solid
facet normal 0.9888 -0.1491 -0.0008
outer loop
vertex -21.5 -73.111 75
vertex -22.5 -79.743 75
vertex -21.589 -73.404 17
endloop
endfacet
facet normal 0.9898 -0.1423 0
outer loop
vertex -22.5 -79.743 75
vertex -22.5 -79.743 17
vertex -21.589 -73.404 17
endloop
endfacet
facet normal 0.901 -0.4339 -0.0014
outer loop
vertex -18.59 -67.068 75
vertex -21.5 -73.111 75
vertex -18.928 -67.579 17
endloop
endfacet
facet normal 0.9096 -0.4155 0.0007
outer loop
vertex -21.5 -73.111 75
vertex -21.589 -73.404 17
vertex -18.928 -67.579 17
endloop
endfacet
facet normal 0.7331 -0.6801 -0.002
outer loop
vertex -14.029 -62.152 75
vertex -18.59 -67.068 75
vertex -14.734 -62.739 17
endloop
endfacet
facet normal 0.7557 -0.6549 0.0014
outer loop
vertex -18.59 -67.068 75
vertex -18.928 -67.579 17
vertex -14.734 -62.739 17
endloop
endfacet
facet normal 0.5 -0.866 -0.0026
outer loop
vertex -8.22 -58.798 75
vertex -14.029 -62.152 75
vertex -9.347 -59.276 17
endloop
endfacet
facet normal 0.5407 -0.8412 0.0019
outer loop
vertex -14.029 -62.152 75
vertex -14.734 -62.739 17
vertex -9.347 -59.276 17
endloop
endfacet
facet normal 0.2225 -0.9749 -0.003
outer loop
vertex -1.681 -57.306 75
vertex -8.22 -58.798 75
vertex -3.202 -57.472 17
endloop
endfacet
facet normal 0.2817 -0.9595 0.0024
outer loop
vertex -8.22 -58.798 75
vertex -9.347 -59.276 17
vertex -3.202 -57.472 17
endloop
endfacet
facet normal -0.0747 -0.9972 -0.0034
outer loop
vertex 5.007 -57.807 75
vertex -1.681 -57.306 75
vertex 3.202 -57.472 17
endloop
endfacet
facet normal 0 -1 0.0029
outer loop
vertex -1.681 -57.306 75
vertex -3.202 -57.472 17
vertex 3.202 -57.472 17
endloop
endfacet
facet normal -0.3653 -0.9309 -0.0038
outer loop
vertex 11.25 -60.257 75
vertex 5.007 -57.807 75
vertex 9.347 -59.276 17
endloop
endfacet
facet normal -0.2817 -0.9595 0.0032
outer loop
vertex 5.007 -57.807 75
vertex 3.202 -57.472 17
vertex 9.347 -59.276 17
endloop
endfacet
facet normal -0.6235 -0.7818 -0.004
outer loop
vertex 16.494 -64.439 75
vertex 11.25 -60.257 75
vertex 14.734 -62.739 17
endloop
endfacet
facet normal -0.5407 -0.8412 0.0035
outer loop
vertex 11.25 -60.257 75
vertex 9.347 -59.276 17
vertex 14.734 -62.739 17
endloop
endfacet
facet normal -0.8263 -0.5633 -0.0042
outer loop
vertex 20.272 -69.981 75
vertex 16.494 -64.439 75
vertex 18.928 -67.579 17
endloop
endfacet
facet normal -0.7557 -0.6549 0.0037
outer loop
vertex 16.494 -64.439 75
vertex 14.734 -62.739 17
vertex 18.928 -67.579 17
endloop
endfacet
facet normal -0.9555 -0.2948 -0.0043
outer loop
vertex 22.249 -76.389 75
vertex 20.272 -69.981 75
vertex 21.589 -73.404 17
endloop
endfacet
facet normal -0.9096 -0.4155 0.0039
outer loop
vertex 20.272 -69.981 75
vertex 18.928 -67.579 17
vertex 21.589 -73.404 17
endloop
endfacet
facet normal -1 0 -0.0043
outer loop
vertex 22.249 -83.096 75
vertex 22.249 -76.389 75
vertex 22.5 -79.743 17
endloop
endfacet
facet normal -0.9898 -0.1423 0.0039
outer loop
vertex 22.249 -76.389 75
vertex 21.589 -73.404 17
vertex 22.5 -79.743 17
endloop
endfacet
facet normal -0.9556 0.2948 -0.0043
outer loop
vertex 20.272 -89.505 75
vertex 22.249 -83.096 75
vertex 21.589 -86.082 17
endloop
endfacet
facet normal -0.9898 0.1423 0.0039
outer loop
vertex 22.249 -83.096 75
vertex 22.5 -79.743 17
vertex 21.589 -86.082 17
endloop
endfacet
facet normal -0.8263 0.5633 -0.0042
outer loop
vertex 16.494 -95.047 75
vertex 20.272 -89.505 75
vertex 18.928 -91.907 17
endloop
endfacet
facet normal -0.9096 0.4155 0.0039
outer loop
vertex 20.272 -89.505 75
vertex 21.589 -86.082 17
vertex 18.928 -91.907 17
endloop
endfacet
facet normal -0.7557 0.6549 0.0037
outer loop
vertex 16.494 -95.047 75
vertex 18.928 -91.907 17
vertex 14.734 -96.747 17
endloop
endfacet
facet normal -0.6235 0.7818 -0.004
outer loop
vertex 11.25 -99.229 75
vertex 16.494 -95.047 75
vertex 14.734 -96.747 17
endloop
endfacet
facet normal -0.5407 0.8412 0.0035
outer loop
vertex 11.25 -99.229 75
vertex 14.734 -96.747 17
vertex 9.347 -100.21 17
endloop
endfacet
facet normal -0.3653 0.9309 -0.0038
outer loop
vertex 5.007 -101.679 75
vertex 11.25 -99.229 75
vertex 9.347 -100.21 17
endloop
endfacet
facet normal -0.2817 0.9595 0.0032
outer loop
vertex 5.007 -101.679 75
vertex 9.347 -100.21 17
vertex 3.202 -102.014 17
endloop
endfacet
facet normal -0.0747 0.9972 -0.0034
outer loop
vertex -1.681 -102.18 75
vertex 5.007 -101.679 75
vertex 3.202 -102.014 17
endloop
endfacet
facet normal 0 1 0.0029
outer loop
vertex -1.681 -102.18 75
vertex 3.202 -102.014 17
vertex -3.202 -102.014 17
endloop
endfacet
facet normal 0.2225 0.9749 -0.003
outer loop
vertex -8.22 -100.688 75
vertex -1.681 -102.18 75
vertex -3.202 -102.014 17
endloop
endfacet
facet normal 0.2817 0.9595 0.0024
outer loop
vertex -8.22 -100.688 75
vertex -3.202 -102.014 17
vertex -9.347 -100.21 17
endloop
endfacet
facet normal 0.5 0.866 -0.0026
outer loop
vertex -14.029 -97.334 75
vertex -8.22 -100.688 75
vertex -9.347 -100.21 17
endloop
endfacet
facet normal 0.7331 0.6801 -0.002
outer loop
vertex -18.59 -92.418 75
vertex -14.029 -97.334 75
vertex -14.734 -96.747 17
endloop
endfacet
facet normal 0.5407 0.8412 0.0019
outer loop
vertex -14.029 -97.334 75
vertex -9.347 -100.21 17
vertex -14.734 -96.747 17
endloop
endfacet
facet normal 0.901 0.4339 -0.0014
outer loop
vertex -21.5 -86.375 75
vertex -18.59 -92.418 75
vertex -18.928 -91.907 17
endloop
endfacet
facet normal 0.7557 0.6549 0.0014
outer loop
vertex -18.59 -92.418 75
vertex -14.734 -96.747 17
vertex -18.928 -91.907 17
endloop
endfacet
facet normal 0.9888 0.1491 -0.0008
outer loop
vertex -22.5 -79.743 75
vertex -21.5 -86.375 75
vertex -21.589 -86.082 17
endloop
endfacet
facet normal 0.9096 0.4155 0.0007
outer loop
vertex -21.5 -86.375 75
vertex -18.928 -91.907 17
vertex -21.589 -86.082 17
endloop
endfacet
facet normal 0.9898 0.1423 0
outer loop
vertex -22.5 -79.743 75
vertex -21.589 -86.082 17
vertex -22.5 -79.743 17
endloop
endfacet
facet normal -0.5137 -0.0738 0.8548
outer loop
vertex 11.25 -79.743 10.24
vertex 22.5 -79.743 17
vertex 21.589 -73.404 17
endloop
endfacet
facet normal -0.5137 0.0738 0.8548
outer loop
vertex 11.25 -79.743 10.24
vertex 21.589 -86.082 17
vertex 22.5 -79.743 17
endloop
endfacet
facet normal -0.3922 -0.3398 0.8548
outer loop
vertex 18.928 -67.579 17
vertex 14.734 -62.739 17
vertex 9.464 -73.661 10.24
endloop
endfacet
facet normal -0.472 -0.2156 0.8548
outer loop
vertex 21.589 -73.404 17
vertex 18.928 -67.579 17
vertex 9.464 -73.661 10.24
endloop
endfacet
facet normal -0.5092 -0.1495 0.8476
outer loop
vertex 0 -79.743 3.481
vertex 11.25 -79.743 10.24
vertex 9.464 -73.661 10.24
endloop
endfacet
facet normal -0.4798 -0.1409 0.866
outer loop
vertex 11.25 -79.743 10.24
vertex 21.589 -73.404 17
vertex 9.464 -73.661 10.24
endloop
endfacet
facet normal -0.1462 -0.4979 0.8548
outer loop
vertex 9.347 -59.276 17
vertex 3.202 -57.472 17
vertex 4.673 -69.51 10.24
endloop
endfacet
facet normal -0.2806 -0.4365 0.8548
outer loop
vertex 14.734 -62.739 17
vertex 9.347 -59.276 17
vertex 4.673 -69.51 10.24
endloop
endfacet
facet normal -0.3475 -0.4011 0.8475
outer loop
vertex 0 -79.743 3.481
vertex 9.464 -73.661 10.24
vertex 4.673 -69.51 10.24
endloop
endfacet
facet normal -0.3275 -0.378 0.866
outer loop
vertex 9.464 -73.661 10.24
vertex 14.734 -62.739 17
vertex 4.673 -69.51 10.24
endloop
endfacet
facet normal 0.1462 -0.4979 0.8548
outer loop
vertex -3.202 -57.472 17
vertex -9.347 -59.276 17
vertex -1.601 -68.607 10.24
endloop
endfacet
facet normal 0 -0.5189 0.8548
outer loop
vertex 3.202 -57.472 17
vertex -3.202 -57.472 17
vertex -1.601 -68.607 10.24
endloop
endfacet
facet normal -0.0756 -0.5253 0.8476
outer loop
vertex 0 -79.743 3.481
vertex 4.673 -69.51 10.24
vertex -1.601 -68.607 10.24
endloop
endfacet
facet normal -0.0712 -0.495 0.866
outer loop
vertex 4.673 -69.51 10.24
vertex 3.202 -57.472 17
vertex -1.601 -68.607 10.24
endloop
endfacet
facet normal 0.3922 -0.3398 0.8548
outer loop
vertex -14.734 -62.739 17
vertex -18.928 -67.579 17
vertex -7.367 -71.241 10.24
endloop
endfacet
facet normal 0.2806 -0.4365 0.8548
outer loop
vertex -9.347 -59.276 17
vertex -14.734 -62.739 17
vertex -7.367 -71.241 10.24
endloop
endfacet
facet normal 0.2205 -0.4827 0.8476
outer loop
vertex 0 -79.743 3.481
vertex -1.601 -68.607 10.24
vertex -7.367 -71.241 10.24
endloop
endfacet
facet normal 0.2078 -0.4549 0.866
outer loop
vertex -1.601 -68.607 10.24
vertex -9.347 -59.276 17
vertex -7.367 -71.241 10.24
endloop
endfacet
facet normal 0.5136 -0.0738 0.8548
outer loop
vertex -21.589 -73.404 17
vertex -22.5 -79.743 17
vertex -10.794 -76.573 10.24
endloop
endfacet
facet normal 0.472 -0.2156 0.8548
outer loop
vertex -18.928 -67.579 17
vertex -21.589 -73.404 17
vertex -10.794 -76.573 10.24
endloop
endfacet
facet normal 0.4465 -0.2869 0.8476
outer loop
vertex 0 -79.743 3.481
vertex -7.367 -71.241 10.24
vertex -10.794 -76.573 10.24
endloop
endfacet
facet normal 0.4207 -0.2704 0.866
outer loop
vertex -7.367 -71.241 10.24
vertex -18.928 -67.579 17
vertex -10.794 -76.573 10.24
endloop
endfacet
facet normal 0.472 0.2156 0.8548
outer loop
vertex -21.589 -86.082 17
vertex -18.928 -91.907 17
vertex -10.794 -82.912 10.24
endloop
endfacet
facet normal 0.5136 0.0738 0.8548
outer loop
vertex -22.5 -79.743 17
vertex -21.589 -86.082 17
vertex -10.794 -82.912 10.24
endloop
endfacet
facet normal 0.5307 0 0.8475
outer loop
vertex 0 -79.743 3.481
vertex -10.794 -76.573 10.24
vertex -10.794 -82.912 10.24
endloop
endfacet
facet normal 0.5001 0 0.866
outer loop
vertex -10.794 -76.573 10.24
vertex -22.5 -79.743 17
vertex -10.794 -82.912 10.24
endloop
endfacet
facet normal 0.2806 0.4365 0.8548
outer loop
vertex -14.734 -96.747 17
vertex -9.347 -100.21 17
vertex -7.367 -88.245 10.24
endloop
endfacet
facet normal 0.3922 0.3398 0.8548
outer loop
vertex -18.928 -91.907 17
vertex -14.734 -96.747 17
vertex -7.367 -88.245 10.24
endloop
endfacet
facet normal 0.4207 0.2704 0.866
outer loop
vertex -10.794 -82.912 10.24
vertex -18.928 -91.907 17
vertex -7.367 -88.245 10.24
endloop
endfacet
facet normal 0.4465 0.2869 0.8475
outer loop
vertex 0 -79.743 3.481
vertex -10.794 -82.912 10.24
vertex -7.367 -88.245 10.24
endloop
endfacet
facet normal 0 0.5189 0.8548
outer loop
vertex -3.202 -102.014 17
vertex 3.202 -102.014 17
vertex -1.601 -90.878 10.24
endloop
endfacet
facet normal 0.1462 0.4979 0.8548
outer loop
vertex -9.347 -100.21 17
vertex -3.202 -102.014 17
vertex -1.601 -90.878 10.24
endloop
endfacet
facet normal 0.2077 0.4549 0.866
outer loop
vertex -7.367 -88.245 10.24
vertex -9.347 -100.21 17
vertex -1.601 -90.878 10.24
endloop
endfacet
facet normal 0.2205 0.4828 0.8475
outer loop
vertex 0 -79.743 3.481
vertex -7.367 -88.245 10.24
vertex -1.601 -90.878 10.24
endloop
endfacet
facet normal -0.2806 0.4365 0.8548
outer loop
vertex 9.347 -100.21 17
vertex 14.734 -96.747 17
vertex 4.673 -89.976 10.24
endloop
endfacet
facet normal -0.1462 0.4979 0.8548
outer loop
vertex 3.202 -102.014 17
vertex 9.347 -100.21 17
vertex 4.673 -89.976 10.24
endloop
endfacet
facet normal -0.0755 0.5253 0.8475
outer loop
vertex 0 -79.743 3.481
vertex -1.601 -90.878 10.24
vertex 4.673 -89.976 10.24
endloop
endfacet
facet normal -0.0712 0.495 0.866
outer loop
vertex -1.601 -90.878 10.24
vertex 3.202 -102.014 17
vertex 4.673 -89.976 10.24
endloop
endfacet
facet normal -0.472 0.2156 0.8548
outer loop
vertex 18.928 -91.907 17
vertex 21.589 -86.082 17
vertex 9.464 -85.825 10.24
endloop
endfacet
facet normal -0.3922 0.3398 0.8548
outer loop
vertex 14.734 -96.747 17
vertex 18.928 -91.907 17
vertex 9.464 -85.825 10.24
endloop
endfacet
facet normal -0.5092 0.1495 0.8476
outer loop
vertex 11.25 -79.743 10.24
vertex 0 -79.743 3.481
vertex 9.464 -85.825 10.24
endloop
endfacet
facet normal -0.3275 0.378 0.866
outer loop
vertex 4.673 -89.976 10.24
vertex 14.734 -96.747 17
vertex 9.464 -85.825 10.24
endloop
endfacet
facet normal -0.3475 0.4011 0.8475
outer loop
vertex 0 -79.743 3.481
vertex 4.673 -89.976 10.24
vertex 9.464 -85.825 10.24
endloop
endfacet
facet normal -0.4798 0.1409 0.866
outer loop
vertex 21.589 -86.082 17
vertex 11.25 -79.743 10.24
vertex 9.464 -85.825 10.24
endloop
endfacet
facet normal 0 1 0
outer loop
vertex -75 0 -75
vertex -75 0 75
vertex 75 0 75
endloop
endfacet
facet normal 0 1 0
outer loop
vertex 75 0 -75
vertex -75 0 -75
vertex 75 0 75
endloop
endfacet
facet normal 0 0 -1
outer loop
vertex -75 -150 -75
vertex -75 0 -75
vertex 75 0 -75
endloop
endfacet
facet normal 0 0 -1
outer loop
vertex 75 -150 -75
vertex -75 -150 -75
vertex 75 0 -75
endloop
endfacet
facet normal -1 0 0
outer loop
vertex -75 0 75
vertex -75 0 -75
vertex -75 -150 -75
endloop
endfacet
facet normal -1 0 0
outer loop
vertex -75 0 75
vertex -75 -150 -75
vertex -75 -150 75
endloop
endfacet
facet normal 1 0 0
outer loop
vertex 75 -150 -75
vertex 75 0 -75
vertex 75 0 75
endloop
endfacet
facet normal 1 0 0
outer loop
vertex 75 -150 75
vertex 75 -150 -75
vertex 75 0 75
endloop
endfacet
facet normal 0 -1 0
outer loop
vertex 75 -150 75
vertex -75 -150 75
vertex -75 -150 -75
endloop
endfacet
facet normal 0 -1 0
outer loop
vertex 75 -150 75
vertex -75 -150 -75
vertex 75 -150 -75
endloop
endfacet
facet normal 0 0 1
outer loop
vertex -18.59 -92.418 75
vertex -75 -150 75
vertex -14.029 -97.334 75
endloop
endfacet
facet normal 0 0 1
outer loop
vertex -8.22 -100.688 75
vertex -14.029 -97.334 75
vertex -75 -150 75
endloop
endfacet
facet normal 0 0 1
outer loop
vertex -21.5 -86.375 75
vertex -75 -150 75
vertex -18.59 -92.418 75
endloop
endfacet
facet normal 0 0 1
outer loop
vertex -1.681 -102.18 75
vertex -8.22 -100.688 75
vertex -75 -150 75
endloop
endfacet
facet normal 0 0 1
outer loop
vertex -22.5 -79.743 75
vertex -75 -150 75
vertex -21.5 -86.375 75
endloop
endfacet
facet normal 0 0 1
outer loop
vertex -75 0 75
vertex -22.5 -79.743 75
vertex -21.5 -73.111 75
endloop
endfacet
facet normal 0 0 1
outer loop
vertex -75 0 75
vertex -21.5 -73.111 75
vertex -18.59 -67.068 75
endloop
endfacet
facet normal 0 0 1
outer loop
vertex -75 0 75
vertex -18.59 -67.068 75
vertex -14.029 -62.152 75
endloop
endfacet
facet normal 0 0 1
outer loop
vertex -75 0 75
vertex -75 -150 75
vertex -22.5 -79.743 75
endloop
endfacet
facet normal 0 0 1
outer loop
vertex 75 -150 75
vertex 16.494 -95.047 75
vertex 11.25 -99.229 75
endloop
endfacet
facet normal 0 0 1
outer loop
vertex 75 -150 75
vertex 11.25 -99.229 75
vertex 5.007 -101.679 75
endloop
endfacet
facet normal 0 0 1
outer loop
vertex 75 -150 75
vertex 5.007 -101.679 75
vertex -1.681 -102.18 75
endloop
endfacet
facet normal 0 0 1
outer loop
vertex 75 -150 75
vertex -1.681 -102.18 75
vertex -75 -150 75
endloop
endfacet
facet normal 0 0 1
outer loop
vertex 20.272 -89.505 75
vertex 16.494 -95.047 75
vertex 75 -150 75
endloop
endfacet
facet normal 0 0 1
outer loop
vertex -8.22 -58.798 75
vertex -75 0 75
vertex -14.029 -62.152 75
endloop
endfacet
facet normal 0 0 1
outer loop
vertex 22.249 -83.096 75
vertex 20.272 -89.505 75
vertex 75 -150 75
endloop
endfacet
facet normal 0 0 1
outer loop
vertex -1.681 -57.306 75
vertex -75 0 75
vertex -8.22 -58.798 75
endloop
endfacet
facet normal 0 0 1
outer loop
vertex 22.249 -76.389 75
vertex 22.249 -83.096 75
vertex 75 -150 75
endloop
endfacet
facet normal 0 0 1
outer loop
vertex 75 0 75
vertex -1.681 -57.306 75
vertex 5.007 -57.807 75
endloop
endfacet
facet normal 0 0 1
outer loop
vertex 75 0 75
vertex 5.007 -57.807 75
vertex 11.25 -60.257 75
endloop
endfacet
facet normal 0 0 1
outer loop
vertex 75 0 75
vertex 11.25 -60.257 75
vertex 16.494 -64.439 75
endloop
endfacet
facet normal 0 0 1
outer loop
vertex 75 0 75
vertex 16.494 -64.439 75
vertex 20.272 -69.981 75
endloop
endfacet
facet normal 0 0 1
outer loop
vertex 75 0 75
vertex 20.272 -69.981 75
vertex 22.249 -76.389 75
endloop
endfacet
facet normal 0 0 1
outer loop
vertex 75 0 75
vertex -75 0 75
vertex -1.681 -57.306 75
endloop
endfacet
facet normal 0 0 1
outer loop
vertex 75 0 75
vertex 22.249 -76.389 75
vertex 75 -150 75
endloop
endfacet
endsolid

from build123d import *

# Parameters (mm, degrees)
F0_W     = 150
F0_H     = 150
F1_DEPTH = 150
F3_D     = 45
F3_DEPTH = 58
F3_TIP   = 13.5193639281


with BuildPart() as f1:
    # F0 (on Front) → F1 (new body)
    with BuildSketch(Plane.XZ):
        Rectangle(F0_W, F0_H)
    extrude(amount=F1_DEPTH)

    # F3
    with Locations(Plane.XY.offset(75)):
        with Locations((0, -79.7429457307)):
            Hole(F3_D / 2, depth=F3_DEPTH)
            with Locations((0, 0, -(F3_DEPTH + F3_TIP / 2))):  # 118° drill point
                Cone(0, F3_D / 2, F3_TIP, mode=Mode.SUBTRACT)


solid = f1.part
